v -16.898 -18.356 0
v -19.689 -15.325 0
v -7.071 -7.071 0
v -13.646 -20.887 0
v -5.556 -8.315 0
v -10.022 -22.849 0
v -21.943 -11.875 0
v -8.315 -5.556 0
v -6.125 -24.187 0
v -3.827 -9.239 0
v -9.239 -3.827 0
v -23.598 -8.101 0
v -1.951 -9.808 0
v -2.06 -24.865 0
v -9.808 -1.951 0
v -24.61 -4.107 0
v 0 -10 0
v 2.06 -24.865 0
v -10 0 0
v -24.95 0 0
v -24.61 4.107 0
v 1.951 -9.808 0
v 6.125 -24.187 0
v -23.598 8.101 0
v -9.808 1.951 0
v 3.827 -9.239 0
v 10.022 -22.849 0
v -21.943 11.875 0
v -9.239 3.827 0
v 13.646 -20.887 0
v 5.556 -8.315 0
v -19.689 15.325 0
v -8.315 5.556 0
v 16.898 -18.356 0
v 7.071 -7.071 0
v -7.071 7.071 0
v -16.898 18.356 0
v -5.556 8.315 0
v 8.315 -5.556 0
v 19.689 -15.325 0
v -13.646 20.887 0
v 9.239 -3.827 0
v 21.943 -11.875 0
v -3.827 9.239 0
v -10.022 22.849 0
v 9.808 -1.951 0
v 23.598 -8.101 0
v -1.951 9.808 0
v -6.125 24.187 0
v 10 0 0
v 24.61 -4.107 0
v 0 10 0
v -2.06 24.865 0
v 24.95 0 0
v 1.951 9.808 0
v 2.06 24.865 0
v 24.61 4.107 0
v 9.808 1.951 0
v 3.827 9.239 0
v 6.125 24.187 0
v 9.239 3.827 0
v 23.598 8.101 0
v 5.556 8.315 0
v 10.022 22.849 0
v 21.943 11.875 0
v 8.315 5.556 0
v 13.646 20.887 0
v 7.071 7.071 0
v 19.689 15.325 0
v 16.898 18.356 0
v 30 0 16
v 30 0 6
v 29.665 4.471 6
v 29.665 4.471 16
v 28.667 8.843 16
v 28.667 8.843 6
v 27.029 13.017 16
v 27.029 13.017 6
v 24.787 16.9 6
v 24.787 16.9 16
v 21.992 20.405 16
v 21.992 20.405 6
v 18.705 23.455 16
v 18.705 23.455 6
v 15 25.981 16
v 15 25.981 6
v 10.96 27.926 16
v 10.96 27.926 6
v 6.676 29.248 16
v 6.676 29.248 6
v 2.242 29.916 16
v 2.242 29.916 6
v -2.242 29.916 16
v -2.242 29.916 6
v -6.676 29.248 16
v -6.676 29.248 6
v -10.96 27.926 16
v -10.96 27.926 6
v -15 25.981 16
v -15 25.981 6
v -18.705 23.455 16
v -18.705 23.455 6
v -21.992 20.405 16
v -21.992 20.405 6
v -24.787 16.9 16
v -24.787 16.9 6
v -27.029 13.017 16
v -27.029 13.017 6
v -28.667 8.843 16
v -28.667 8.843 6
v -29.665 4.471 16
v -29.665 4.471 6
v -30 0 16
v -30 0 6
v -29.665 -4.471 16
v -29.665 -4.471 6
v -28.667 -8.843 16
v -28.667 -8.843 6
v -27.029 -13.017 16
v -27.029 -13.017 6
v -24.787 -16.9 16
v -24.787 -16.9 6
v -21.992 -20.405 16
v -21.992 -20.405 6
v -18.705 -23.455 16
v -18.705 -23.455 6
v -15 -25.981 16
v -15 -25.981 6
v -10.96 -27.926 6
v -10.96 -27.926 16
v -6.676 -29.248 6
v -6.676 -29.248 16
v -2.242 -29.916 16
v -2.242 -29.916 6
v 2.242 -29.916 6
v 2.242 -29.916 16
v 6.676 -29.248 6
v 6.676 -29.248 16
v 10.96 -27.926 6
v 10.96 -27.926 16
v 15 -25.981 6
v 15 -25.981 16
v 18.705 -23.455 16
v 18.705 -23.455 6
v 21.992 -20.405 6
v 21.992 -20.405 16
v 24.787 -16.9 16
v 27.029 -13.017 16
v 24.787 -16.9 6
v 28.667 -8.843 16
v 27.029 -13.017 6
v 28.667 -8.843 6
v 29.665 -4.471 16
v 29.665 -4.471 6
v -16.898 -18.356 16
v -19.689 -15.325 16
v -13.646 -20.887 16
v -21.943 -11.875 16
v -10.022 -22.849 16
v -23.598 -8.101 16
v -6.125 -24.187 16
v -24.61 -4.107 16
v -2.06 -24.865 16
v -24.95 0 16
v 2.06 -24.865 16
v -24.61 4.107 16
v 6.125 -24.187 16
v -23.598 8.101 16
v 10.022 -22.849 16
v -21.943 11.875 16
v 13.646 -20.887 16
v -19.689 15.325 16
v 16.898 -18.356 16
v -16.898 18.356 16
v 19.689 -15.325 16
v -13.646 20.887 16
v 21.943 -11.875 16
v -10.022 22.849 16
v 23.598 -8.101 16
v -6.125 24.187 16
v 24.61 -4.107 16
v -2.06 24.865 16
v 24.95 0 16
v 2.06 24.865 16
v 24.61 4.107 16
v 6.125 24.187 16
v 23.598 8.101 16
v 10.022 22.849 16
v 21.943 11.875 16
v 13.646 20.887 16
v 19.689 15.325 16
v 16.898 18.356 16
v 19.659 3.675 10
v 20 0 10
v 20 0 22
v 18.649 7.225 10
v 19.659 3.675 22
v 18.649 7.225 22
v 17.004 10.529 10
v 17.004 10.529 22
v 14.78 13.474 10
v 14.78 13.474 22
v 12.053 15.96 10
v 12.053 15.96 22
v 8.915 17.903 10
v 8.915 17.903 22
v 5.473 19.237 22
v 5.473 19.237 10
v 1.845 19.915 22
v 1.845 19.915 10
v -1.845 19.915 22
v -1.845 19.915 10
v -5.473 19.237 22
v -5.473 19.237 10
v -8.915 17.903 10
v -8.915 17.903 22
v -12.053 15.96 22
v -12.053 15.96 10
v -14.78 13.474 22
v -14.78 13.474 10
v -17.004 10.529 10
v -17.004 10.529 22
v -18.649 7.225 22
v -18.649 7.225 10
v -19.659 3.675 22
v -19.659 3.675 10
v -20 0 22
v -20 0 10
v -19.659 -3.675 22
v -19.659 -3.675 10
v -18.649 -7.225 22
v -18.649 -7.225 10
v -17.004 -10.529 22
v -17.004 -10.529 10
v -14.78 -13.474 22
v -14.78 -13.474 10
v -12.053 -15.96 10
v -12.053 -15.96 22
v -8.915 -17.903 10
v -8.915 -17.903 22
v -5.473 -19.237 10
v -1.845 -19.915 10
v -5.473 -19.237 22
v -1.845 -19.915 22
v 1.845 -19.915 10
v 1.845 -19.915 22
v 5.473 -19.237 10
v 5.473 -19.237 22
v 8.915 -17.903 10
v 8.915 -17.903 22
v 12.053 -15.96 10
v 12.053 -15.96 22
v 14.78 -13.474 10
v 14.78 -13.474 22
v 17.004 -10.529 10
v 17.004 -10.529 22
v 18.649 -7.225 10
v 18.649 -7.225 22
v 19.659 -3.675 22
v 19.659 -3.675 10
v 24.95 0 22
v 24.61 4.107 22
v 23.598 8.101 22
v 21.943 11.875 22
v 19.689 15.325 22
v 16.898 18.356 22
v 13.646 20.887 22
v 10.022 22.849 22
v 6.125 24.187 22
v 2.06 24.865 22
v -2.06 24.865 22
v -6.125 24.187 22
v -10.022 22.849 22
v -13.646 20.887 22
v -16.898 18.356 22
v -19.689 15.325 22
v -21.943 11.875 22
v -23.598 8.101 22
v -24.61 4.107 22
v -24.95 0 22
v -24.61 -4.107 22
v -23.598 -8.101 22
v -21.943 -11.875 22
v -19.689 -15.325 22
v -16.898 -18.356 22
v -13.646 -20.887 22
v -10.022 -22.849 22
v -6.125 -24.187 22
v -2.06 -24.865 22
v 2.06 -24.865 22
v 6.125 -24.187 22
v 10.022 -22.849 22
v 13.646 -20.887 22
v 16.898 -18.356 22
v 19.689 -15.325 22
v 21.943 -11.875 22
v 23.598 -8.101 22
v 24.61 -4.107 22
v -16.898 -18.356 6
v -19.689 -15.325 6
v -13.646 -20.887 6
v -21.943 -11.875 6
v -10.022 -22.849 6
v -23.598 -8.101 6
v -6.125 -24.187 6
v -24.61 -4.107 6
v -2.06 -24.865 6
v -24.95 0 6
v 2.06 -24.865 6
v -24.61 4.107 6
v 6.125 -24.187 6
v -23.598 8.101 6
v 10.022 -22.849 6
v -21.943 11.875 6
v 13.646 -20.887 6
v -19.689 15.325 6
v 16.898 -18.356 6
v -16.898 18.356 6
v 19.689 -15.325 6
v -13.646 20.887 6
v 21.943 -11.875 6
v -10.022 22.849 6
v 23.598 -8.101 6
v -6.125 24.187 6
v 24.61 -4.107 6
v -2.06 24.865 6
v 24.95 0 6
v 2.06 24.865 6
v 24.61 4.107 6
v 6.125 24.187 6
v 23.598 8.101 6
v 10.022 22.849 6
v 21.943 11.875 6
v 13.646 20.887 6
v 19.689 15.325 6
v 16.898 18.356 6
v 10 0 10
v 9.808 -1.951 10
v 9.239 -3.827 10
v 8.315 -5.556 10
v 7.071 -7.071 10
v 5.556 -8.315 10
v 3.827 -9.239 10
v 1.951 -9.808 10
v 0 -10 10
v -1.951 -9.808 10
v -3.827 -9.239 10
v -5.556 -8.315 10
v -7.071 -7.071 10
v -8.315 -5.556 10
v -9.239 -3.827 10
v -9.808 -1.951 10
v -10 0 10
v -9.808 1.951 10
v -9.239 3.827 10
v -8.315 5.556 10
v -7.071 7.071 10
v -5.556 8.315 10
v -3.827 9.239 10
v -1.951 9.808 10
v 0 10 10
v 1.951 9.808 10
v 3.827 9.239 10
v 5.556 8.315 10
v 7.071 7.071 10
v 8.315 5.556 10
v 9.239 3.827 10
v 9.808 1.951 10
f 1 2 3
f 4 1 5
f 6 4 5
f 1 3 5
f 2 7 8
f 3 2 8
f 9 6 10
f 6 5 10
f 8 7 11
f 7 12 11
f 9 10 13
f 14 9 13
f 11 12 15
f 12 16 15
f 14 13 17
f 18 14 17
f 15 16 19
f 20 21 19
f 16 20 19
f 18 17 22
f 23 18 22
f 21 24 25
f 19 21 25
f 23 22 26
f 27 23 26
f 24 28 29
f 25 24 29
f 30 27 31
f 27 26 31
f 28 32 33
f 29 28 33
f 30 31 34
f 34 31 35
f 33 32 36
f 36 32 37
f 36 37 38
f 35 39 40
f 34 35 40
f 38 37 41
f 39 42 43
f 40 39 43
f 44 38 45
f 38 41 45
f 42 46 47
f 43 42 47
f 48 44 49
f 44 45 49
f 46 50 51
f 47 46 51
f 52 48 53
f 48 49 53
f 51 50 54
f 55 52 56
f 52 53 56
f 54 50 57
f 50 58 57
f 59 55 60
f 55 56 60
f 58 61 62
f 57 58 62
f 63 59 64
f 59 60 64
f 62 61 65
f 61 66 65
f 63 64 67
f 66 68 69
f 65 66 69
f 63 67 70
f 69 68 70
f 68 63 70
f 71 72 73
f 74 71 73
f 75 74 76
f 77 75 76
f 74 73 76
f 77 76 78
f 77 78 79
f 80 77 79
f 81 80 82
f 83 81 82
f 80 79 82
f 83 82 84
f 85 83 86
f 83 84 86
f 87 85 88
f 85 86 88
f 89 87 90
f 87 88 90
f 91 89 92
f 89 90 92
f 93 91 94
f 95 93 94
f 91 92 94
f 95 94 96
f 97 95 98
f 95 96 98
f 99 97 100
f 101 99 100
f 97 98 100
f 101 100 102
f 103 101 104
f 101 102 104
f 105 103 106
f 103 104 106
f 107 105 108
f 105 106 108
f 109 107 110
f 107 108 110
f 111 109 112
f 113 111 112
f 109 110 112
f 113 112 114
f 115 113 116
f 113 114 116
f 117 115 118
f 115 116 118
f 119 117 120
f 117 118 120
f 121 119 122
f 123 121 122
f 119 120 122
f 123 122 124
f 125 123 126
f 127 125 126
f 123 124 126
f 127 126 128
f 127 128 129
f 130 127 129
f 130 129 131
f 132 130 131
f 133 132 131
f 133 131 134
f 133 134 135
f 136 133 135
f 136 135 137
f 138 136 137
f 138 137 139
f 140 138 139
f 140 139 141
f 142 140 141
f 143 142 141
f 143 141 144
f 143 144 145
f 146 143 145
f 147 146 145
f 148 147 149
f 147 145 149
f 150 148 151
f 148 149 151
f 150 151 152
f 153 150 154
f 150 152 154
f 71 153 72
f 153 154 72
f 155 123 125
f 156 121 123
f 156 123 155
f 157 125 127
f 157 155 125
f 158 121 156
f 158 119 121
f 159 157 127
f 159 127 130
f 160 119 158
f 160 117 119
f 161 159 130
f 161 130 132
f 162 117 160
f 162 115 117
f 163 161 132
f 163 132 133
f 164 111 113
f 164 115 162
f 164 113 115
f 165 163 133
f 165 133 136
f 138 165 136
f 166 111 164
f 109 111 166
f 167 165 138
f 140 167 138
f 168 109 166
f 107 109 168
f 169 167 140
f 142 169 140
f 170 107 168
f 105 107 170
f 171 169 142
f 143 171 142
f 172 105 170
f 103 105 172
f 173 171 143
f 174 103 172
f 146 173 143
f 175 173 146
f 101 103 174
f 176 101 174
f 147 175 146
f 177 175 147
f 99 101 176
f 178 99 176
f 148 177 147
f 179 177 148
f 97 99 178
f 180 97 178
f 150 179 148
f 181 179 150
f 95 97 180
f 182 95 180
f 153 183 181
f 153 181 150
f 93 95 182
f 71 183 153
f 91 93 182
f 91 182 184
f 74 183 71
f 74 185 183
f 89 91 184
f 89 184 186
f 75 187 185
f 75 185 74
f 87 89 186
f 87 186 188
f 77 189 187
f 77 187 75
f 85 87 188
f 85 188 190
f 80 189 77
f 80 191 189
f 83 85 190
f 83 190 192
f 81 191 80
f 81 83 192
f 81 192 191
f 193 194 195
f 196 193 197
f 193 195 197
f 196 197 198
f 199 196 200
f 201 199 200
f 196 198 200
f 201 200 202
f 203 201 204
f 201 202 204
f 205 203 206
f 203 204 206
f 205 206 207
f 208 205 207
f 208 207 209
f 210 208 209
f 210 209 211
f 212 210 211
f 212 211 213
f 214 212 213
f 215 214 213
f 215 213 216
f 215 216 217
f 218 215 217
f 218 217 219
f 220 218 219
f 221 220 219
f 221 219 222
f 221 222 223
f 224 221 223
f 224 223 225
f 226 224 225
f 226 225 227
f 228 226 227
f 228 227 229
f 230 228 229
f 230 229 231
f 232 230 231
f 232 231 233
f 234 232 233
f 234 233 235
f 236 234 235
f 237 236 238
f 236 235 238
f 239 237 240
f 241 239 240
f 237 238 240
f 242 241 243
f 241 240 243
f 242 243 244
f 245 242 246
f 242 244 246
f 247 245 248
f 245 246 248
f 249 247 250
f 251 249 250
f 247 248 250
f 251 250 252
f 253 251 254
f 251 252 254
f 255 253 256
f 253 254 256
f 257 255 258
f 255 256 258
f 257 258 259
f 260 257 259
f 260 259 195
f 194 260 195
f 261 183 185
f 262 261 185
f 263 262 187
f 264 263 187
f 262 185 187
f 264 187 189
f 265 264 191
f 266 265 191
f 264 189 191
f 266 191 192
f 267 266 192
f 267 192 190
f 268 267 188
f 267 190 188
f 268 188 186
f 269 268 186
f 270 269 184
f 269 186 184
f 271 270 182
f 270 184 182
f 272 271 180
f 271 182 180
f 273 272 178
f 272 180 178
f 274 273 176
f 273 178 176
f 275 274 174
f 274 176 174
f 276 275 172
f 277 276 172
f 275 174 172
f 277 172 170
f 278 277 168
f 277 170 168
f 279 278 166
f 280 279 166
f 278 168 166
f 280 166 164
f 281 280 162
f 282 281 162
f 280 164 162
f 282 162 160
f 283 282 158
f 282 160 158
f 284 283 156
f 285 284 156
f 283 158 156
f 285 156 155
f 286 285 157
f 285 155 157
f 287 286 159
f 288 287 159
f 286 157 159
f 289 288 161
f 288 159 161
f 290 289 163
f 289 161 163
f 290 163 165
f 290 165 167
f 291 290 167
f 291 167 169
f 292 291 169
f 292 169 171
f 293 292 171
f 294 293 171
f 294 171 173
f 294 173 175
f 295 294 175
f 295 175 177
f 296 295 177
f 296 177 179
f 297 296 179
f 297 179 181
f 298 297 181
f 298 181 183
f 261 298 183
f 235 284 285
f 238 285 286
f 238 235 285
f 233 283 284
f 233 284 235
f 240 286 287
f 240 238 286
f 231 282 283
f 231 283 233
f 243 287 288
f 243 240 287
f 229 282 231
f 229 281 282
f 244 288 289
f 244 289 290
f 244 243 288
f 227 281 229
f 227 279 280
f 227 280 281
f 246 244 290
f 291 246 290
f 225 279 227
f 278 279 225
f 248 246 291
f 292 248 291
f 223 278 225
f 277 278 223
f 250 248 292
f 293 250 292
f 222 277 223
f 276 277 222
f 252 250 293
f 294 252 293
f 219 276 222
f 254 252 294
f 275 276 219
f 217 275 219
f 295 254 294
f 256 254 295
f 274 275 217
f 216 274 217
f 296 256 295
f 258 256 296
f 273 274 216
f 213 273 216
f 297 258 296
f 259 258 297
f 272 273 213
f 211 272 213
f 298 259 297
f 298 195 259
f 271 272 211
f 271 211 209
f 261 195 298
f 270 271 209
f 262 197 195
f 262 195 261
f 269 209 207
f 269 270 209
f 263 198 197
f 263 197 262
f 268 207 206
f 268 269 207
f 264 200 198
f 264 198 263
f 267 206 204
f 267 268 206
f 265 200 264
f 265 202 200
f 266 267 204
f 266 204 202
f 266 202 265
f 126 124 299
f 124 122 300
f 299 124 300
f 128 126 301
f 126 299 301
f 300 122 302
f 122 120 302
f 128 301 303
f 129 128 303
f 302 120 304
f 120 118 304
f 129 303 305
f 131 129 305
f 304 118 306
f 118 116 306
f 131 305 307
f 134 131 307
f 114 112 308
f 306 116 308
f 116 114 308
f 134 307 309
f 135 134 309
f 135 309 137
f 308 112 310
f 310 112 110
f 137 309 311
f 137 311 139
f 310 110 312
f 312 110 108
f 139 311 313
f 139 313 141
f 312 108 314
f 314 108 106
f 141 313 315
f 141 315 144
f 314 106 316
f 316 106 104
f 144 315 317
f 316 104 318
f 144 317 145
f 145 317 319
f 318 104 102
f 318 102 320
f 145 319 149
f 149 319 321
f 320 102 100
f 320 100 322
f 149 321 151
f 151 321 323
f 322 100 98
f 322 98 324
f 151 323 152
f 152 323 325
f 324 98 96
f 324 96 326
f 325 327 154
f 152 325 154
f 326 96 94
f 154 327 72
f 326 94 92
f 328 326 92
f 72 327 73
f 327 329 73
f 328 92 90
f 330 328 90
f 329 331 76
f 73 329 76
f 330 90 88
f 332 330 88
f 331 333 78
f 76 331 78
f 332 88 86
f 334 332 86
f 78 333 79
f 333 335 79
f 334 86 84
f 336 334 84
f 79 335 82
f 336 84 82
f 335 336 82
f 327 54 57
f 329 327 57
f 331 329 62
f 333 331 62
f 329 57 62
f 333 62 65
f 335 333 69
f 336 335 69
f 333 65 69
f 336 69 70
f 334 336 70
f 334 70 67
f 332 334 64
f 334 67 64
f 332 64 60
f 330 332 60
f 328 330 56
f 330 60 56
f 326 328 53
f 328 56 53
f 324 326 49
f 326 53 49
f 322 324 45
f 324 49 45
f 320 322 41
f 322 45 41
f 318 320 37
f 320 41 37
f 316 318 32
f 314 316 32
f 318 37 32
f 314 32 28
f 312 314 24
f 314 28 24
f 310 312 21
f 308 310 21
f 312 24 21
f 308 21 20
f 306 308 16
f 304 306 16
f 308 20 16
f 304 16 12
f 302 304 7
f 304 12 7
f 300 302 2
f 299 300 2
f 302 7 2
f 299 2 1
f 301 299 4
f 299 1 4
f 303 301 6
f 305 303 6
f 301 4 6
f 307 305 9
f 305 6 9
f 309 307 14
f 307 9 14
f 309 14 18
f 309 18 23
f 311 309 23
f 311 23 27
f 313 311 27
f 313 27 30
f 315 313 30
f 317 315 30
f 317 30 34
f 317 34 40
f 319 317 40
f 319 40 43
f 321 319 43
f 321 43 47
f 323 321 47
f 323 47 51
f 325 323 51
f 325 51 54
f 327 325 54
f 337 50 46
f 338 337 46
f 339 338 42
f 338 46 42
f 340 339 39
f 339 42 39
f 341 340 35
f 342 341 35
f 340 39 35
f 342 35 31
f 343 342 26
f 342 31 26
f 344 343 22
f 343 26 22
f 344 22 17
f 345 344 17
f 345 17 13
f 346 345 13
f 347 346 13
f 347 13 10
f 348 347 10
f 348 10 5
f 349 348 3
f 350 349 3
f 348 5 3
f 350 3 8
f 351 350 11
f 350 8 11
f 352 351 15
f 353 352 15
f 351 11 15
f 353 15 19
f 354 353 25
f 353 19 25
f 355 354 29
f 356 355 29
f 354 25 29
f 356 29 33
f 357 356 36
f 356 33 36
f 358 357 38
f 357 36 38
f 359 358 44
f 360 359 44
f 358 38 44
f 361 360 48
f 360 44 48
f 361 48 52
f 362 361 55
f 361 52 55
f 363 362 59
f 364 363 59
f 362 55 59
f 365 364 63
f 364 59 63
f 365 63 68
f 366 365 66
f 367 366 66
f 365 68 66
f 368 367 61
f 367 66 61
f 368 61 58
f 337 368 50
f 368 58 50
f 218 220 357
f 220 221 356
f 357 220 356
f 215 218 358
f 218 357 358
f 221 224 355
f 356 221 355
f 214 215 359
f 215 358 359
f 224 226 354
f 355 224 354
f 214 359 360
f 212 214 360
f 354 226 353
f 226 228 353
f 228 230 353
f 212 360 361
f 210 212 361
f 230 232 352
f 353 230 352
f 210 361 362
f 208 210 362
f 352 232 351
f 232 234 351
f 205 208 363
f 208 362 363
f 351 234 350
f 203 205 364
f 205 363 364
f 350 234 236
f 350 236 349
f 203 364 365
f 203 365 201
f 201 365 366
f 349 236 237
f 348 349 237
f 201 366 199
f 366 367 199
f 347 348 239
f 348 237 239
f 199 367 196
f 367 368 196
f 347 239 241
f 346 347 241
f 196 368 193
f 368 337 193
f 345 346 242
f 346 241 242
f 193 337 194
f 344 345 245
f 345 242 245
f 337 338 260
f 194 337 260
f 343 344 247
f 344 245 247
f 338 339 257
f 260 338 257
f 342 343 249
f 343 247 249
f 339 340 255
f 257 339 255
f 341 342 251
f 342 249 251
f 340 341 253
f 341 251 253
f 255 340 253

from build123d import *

# Parameters (mm, degrees)
F0_R     = 24.95
F1_DEPTH = 6
F2_R     = 30
F3_DEPTH = 10
F4_R     = 24.95
F5_DEPTH = 6
F6_R     = 20
F7_DEPTH = 22.001
F8_R     = 24.95
F8_R_2   = 10
F9_DEPTH = 10


with BuildPart() as f1:
    # F0 (on Top) → F1 (new body)
    with BuildSketch(Plane.XY):
        Circle(F0_R)
    extrude(amount=F1_DEPTH)

    # F2 (on face) → F3 (join)
    with BuildSketch(Plane.XY.offset(6)):
        Circle(F2_R)
    extrude(amount=F3_DEPTH)

    # F4 (on face) → F5 (join)
    with BuildSketch(Plane.XY.offset(16)):
        Circle(F4_R)
    extrude(amount=F5_DEPTH)

    # F6 (on face) → F7 (cut, through all)
    with BuildSketch(Plane.XY.offset(22)):
        Circle(F6_R)
    extrude(amount=-F7_DEPTH, mode=Mode.SUBTRACT)

    # F8 (on face) → F9 (join)
    with BuildSketch(Plane(origin=(0, 0, 0), x_dir=(1, 0, 0), z_dir=(0, 0, -1))):
        Circle(F8_R)
        Circle(F8_R_2, mode=Mode.SUBTRACT)
    extrude(amount=-F9_DEPTH)


solid = f1.part
